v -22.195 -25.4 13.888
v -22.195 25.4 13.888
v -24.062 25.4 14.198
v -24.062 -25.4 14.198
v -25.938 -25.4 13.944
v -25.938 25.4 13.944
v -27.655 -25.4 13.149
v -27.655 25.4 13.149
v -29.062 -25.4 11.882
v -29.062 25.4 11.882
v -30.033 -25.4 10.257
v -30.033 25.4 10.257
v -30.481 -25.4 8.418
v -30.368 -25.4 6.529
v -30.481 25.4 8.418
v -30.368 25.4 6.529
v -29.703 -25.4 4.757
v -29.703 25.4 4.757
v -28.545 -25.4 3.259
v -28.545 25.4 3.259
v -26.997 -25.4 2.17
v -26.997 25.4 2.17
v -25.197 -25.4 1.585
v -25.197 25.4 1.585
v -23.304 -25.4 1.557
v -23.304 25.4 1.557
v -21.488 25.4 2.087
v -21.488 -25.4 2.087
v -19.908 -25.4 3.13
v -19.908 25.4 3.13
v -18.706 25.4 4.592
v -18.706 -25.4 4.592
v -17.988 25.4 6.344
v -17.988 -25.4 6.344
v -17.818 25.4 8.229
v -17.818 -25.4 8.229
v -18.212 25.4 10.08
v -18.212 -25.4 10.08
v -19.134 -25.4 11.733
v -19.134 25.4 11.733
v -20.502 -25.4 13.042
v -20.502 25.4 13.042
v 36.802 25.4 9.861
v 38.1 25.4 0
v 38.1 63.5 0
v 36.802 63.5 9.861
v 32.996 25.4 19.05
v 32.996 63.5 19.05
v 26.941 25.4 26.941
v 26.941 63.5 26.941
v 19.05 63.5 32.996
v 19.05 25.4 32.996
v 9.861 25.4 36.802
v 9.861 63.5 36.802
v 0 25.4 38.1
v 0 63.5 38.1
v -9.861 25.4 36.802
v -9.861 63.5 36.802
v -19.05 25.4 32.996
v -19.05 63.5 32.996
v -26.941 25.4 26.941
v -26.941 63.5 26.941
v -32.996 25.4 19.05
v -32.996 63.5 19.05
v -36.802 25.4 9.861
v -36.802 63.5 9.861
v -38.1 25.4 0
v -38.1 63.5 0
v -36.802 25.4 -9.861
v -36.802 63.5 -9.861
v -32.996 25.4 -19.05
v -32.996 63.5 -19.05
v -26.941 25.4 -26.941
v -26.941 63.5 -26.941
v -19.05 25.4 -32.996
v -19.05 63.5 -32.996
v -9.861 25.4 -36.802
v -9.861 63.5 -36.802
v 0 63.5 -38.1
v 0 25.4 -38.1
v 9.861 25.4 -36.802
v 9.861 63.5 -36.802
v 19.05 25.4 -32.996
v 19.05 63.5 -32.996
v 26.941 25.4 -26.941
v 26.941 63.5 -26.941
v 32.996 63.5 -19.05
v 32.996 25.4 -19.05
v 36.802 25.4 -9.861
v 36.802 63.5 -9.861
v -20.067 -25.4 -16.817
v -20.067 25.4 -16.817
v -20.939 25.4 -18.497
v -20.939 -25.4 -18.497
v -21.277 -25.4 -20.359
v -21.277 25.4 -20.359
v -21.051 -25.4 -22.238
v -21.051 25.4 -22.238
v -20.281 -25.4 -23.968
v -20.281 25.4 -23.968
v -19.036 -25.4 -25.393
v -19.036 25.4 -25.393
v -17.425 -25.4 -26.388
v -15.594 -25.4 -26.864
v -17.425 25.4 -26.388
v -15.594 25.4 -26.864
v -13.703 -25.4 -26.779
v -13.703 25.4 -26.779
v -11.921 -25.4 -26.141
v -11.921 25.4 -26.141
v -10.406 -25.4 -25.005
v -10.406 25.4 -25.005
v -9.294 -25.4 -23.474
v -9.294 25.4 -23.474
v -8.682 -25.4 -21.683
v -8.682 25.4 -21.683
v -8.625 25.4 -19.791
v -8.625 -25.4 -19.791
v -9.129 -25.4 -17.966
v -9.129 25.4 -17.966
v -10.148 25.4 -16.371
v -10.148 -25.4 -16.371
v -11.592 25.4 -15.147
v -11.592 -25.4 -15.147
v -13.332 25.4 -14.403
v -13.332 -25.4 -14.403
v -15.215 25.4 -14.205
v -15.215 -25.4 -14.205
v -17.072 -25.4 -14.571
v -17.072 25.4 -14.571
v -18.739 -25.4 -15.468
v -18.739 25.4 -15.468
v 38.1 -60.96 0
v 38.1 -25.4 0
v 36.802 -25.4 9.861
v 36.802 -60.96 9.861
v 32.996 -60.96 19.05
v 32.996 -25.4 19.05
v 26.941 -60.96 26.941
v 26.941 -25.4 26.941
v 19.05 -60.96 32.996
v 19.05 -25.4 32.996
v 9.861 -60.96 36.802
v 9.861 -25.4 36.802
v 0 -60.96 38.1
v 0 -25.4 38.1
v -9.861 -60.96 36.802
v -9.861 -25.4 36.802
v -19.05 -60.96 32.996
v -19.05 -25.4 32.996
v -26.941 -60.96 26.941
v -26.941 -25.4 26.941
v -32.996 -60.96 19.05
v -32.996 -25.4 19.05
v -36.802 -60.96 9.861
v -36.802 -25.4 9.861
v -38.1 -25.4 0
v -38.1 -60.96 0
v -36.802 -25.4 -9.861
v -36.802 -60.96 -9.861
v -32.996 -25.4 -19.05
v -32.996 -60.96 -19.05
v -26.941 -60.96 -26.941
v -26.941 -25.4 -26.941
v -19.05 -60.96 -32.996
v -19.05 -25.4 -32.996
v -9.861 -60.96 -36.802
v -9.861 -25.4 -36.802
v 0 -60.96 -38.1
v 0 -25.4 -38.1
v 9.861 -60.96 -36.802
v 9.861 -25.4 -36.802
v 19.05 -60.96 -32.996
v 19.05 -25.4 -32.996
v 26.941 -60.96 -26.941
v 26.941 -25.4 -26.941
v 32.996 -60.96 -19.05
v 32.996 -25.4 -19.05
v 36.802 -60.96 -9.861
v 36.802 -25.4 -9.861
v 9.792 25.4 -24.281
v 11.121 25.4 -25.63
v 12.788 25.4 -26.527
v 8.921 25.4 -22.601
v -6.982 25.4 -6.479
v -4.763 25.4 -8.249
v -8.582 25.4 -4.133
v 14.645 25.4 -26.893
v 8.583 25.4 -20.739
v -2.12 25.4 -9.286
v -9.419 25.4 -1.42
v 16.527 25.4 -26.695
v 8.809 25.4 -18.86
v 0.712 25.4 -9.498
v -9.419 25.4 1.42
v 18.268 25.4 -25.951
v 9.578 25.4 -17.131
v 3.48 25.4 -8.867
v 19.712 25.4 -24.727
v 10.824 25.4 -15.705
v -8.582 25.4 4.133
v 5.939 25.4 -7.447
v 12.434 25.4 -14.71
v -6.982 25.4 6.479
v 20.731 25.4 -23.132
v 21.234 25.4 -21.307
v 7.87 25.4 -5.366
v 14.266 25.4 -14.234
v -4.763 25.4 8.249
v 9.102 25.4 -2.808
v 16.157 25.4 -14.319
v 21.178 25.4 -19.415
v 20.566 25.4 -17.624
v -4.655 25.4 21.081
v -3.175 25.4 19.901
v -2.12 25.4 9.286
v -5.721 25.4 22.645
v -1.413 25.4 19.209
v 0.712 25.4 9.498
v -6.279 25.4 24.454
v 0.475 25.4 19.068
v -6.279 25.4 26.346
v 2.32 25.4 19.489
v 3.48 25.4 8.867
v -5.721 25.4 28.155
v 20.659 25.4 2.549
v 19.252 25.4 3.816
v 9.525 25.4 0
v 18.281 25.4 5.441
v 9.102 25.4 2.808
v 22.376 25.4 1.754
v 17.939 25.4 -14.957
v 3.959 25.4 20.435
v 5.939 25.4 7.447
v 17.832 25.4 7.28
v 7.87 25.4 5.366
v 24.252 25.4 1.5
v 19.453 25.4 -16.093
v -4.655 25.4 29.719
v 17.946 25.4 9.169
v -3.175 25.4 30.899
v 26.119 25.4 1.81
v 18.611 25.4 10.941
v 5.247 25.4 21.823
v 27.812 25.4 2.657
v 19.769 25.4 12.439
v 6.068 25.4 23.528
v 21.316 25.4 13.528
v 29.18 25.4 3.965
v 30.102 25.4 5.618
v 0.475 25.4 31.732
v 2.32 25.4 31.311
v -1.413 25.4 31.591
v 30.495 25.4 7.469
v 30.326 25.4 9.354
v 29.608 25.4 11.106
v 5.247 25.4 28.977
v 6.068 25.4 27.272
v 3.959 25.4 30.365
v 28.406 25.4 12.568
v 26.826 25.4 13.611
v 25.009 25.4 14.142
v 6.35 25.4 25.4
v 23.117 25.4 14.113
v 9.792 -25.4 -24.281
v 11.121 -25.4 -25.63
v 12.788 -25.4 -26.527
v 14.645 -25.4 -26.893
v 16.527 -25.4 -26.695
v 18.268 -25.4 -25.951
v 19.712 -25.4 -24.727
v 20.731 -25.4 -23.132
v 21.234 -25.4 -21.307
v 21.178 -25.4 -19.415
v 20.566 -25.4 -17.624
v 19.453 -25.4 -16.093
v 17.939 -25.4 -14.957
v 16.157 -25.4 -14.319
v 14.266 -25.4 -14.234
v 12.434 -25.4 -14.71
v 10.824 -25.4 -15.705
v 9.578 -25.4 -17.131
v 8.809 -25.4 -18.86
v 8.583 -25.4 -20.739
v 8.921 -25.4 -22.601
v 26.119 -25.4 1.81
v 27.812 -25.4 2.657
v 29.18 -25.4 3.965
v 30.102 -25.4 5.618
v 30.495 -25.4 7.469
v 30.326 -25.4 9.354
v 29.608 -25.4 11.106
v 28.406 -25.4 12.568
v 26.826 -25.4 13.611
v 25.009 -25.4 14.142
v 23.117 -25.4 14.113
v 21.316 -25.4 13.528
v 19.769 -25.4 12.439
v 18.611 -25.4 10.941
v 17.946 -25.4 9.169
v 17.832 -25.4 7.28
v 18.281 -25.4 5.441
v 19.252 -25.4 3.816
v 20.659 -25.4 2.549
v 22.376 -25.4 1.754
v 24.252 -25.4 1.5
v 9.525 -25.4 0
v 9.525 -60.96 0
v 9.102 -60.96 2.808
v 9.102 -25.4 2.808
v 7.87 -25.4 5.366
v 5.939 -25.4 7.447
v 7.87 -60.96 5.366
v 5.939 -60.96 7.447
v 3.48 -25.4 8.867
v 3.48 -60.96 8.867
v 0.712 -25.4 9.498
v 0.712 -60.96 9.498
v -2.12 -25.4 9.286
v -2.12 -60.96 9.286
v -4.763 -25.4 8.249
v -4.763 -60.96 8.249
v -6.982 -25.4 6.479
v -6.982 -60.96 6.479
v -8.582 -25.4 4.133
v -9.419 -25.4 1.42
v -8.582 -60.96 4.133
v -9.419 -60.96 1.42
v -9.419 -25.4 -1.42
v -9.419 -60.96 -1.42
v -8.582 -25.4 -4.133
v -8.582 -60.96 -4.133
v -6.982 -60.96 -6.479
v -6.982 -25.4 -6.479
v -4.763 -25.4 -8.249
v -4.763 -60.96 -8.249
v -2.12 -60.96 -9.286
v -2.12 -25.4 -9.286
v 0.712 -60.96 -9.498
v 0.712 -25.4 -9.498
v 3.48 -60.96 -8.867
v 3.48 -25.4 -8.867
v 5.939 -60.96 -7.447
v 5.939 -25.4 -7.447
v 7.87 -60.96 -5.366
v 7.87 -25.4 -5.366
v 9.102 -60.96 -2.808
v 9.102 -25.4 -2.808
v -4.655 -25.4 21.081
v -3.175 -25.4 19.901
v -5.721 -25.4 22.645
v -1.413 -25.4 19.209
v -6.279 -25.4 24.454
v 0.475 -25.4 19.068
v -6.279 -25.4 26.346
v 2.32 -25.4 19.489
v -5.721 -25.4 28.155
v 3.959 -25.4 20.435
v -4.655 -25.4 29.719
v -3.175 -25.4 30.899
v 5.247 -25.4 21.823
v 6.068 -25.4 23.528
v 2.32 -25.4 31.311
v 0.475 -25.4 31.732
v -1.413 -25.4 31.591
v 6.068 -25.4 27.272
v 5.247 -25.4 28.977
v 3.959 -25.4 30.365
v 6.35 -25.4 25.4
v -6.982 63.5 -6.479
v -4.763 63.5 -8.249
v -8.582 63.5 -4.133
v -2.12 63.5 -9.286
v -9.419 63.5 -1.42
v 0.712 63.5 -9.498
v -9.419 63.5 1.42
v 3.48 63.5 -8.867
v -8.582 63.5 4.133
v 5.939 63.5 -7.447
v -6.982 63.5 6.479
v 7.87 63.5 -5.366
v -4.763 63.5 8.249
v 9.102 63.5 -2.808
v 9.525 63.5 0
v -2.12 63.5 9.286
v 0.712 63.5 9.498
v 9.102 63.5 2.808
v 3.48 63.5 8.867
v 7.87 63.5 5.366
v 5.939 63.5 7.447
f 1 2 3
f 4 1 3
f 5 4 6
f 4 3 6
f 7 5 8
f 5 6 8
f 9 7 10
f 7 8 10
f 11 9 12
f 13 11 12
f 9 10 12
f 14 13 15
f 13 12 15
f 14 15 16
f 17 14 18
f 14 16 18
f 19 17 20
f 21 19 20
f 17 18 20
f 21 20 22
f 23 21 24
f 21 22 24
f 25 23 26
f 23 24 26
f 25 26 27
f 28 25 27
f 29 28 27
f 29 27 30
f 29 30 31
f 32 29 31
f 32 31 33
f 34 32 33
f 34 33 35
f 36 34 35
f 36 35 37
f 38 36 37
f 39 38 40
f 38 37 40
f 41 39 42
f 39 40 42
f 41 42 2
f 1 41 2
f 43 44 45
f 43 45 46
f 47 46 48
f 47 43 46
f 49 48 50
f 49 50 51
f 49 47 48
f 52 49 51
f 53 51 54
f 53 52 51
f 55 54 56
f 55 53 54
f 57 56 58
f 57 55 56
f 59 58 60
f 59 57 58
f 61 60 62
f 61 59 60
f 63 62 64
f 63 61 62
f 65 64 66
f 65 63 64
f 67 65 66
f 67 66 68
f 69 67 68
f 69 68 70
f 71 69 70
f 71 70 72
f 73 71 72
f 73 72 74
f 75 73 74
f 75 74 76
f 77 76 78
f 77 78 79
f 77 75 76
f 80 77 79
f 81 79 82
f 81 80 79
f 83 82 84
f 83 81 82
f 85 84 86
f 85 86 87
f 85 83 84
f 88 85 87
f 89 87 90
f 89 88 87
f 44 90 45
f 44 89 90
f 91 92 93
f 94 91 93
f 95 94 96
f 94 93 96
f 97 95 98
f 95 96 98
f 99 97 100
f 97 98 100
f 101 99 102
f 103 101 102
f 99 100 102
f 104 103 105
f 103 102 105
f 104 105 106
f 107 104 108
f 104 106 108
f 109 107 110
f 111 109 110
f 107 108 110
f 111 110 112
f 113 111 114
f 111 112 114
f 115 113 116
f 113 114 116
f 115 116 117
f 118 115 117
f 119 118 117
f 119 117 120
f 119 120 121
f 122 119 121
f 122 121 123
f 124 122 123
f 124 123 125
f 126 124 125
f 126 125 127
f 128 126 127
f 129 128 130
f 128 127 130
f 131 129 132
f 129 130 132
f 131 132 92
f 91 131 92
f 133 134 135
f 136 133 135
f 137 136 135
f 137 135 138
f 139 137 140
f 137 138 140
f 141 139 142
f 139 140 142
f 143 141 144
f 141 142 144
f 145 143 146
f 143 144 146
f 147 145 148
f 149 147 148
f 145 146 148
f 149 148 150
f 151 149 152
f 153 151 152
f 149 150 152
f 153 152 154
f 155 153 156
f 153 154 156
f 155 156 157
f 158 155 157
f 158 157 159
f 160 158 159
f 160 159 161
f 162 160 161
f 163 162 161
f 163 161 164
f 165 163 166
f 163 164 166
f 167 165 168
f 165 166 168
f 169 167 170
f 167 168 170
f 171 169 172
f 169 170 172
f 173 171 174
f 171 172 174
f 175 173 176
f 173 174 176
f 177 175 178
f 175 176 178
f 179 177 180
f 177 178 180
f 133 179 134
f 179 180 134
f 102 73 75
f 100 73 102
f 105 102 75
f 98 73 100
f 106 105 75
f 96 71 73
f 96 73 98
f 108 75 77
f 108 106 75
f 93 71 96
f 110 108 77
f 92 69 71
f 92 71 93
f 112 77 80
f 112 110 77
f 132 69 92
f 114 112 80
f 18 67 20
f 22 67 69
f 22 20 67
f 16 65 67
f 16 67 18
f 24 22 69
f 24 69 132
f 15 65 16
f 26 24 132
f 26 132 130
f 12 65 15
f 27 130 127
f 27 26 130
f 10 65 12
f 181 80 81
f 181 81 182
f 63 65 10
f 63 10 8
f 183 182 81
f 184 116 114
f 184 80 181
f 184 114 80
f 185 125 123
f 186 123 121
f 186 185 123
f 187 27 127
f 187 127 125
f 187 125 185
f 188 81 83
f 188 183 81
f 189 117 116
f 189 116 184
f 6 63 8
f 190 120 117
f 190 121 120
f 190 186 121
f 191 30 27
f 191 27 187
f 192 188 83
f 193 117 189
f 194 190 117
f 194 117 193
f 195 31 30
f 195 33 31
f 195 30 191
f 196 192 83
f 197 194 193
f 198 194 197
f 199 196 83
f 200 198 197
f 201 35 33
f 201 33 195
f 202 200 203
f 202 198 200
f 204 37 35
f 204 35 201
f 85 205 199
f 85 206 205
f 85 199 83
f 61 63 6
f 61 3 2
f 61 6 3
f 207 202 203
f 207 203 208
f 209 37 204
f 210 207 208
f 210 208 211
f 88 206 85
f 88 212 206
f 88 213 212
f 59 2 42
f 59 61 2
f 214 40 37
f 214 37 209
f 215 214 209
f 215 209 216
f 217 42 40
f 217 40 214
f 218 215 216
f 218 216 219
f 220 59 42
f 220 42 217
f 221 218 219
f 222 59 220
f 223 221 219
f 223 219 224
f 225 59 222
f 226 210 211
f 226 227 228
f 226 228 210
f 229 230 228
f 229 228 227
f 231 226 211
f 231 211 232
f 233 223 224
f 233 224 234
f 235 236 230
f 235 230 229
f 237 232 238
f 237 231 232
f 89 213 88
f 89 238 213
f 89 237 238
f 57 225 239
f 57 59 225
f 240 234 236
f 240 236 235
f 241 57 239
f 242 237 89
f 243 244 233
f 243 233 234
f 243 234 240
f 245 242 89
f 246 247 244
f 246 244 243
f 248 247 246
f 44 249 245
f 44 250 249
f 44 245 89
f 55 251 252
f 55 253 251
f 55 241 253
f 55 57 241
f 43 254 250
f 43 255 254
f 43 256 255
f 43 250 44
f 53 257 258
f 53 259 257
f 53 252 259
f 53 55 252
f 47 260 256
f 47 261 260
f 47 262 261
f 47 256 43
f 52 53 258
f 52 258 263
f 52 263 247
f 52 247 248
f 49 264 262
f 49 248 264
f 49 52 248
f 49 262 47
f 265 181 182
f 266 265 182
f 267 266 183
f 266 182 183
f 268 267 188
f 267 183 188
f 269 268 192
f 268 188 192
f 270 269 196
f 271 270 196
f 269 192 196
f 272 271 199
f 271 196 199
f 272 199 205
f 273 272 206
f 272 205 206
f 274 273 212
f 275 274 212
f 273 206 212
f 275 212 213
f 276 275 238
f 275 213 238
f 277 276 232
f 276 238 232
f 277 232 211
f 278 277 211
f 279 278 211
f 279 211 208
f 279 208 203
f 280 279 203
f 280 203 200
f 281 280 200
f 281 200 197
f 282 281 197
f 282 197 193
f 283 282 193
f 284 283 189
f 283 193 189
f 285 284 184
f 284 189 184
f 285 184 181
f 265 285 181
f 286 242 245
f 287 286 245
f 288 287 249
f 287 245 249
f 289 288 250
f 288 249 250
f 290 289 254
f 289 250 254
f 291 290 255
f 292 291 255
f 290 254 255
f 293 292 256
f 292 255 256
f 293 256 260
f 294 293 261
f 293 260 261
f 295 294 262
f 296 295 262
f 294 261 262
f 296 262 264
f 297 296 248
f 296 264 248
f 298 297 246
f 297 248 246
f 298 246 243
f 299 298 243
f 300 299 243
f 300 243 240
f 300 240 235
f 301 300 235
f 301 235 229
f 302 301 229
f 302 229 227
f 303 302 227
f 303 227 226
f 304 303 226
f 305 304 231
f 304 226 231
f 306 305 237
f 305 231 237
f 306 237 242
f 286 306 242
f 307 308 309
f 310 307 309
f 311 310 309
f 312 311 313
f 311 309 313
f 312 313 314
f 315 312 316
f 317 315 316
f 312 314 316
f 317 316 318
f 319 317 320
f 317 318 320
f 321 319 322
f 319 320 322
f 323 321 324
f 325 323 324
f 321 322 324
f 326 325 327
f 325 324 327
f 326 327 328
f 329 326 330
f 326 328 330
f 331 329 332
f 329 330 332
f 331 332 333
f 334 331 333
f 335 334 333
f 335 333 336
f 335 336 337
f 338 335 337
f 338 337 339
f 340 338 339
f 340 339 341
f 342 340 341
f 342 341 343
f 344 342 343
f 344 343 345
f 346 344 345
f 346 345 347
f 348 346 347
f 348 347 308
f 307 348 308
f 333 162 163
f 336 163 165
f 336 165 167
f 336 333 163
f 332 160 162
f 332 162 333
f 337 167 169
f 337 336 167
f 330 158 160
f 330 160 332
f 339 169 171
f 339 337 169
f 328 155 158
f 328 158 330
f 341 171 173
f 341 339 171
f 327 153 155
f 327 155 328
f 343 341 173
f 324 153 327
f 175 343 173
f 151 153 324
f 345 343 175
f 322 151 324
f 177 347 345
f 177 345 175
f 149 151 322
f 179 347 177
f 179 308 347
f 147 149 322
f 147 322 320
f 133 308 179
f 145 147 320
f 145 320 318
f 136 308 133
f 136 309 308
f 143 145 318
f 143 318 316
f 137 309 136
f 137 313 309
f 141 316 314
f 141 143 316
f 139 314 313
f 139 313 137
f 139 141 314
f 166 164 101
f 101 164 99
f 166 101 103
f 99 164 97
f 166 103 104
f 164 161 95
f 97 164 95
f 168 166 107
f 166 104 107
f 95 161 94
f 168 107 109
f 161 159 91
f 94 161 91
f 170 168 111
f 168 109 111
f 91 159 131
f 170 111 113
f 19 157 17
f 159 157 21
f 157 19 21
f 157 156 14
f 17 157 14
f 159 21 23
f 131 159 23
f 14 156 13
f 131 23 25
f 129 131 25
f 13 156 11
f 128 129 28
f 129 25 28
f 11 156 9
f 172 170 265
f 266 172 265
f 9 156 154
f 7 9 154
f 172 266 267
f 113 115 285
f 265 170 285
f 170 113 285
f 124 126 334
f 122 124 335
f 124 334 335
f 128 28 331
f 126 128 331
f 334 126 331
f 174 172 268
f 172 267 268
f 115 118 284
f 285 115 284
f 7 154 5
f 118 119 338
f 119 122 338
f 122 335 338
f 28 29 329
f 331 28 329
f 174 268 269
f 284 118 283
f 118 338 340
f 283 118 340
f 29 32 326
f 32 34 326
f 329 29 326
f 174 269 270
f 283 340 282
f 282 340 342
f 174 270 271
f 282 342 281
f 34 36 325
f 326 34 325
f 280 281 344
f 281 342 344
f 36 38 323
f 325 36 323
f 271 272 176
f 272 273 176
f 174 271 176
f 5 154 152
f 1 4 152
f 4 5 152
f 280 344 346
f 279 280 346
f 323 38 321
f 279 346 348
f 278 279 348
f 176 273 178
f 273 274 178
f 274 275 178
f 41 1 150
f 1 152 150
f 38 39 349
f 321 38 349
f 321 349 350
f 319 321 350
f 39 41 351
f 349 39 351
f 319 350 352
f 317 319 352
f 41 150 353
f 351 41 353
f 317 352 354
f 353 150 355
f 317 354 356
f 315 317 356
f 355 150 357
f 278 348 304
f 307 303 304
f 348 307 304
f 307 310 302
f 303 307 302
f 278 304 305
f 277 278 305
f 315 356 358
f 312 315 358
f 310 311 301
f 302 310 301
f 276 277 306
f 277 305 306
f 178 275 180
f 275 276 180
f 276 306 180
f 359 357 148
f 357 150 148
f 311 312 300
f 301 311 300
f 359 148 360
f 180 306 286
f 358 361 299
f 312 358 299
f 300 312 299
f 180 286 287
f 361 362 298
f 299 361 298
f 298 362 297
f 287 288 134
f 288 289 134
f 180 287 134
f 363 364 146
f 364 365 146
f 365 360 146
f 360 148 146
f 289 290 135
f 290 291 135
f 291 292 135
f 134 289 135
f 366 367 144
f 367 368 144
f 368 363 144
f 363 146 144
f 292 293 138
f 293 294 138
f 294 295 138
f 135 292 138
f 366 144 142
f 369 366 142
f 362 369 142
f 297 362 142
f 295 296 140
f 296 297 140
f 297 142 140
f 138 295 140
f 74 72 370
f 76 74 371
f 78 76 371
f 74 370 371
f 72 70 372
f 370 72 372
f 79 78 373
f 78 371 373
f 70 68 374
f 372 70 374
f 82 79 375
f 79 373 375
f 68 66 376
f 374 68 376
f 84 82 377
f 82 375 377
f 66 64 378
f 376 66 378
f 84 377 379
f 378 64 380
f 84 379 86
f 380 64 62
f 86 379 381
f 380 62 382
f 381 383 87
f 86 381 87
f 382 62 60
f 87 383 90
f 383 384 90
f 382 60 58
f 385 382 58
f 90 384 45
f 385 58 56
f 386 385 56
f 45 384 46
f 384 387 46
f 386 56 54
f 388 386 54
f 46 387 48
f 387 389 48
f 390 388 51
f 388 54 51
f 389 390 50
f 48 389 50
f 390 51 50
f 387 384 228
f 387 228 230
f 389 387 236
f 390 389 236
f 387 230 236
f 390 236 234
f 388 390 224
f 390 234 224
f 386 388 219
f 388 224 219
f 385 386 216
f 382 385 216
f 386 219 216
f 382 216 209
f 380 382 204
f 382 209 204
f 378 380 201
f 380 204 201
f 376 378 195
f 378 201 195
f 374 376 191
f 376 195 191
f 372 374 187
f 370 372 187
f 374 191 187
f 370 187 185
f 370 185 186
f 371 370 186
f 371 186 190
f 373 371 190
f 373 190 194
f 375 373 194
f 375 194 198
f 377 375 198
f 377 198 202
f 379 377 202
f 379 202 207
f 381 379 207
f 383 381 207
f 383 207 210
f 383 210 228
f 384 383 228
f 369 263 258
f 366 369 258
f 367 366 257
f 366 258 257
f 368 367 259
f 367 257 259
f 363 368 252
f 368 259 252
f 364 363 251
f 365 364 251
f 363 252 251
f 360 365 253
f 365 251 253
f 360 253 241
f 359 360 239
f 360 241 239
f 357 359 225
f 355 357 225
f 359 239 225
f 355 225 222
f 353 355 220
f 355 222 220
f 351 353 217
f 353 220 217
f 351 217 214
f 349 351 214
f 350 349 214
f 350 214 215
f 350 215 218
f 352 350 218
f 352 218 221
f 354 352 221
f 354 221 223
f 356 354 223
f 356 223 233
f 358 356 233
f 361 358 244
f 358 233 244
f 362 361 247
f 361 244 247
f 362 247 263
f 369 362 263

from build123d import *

# Parameters (mm, degrees)
F1_START        = -25.4
F0_R            = 38.1
F1_DEPTH        = 38.1
F2_R            = 6.35
F3_DEPTH        = 50.8
F3_COPIES_COUNT = 5
F4_R            = 38.1
F5_DEPTH        = 35.56
F6_R            = 9.525
F7_DEPTH        = 124.461


# Not quite as in the source:
# - a pattern or mirror of a feature is missing from the dataset's text; its kind, count and spacing are read off the source's solid


with BuildPart() as f1:
    # F0 (on Front) → F1 (new body)
    with BuildSketch(Plane.XZ.offset(F1_START)):
        Circle(F0_R)
    extrude(amount=-F1_DEPTH)

    # F2 (on face) → F3 (join)
    with BuildSketch(Plane.XZ.offset(-25.4)):
        with Locations((0, 25.4)):
            Circle(F2_R)
    f3 = extrude(amount=F3_DEPTH)

    # F3_copies: F3 ×5 about axis
    f3_copies_axis = Axis((0, 0, 0), (0, 1, 0))
    for i in range(1, F3_COPIES_COUNT):
        add(f3.rotate(f3_copies_axis, i * 360 / F3_COPIES_COUNT))

    # F4 (on face) → F5 (join)
    with BuildSketch(Plane.XZ.offset(25.4)):
        Circle(F4_R)
    extrude(amount=F5_DEPTH)

    # F6 (on face) → F7 (cut, through all)
    with BuildSketch(Plane.XZ.offset(60.96)):
        Circle(F6_R)
    extrude(amount=-F7_DEPTH, mode=Mode.SUBTRACT)


solid = f1.part
